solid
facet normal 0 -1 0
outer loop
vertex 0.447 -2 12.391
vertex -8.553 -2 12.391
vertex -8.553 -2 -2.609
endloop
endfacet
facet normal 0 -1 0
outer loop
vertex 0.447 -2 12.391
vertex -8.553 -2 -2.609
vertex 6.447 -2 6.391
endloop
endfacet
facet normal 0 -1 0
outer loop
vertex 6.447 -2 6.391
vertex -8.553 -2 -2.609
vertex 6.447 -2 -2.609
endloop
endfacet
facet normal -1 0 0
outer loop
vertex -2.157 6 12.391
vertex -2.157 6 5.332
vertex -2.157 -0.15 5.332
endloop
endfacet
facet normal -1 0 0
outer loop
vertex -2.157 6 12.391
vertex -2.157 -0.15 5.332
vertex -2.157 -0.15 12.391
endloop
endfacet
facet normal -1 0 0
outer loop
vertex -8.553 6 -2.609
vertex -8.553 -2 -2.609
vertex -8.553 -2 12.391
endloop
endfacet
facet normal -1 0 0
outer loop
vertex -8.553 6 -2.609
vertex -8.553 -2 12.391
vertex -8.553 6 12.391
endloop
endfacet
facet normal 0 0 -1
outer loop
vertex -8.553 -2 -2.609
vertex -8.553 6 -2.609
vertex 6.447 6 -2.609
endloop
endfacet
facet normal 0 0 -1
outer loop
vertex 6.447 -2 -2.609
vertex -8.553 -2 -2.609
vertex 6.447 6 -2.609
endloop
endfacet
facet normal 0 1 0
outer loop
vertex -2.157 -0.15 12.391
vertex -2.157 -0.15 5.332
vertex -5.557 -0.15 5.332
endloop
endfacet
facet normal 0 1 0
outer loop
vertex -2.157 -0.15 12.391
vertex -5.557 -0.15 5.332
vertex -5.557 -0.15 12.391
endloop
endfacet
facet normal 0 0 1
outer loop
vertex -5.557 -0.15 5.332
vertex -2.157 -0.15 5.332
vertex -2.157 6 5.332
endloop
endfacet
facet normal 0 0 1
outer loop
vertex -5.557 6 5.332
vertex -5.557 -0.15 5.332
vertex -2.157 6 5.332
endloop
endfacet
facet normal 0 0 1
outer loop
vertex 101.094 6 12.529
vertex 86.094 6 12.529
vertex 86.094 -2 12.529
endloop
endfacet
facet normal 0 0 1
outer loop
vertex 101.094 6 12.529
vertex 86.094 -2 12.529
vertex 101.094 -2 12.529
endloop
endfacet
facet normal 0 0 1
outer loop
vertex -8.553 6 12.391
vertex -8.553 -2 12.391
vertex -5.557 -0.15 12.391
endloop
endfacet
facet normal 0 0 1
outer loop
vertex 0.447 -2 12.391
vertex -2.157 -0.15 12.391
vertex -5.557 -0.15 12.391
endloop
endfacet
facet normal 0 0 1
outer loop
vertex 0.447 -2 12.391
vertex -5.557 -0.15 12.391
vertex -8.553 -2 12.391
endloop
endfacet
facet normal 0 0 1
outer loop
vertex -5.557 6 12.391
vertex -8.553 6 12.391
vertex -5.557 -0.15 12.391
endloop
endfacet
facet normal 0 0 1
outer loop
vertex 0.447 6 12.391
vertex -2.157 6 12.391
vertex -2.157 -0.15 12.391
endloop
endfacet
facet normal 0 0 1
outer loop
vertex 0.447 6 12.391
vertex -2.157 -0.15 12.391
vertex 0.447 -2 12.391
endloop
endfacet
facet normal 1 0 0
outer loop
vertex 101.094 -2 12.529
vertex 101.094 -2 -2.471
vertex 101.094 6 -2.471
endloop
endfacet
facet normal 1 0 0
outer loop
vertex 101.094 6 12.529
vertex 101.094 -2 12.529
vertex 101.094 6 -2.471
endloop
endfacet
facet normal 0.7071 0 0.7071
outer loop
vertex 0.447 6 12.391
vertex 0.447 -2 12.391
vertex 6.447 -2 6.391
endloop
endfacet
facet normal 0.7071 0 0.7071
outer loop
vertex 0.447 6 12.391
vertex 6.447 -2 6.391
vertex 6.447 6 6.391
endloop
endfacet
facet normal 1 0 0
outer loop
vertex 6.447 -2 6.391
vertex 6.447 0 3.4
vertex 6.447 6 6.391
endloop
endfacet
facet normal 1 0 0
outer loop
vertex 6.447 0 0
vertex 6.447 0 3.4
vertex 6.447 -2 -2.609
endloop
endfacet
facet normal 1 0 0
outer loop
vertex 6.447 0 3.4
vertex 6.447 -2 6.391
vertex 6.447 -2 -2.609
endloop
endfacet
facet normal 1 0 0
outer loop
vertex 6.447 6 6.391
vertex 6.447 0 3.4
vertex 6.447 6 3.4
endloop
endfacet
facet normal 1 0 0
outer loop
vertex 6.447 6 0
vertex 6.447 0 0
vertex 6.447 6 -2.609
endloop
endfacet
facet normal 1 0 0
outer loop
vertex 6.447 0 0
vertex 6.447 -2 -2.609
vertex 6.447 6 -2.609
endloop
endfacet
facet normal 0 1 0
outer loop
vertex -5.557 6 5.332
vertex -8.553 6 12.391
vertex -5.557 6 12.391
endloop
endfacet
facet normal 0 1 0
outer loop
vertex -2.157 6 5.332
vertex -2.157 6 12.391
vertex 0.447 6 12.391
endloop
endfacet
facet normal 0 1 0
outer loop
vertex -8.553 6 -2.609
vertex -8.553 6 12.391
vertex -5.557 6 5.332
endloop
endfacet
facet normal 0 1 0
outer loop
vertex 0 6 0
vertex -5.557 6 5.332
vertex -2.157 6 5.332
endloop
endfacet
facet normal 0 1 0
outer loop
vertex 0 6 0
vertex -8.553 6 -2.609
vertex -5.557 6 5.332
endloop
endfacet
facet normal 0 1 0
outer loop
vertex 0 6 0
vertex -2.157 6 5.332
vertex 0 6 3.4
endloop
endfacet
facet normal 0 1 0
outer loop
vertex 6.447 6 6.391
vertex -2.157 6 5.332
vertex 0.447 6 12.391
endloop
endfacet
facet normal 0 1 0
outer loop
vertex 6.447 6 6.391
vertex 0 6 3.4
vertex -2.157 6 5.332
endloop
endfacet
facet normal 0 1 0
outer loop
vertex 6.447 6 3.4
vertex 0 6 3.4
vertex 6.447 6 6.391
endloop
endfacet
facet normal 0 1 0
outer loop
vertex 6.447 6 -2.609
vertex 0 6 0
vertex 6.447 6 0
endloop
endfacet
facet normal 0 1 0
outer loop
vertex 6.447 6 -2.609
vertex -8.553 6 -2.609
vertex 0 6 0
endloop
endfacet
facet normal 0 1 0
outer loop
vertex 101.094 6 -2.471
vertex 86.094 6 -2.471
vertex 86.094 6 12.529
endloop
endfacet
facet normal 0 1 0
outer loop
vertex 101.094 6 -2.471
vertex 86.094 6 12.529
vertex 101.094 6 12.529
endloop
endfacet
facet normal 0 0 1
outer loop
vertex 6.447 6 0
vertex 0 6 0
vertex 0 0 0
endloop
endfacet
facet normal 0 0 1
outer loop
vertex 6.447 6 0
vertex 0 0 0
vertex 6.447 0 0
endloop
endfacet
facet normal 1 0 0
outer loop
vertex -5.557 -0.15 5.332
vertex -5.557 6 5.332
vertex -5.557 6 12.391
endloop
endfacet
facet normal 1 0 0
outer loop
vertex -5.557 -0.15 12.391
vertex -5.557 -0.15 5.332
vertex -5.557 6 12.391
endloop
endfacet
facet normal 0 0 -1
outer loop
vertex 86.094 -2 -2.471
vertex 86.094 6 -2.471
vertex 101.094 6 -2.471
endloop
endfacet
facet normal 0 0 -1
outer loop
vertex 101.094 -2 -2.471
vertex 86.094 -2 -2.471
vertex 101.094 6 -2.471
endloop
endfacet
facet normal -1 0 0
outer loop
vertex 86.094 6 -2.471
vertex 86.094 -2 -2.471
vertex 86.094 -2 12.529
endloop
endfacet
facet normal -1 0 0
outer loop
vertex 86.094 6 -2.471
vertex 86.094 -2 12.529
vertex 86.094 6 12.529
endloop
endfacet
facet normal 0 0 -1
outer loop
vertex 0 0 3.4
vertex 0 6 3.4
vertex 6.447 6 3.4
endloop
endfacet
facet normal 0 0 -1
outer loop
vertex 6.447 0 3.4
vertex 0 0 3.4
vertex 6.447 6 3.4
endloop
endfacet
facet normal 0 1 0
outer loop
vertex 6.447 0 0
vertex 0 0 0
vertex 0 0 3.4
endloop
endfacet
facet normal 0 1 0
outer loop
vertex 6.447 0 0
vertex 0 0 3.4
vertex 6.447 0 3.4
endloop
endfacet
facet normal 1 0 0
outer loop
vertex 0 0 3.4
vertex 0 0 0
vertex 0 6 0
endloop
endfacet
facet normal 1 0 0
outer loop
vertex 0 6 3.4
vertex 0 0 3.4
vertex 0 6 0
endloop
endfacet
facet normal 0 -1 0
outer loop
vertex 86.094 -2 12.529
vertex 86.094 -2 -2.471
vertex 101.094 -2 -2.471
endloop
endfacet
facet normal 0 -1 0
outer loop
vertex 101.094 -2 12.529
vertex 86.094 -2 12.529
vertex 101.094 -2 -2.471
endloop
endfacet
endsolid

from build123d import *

# Parameters (mm, degrees)
BOX_W             = 90
BOX_H             = 93.7
BOX_DEPTH         = 3.4
CLONE_PITCH_ANGLE = -90
ARRAY001_X_COUNT  = 3
ARRAY001_X_PITCH  = 97.7
ARRAY001_Y_COUNT  = 2
ARRAY001_Y_PITCH  = 97.7
ARRAY001_Z_COUNT  = 2
ARRAY001_Z_PITCH  = 97.7
ARRAY_X_COUNT     = 2
ARRAY_X_PITCH     = 97.7
ARRAY_Z_COUNT     = 3
ARRAY_Z_PITCH     = 97.7
BOX001_W          = 15
BOX001_H          = 8
BOX001_DEPTH      = 15
CHAMFER_SIZE      = 6
BOX002_W          = 15
BOX002_H          = 8
BOX002_DEPTH      = 15


with BuildPart() as cubo:
    # Box → Box (new body)
    with BuildSketch(Plane.XY):
        with Locations((45, 46.85)):
            Rectangle(BOX_W, BOX_H)
    extrude(amount=BOX_DEPTH)


with BuildPart() as array001:
    # Clone base: copy of Cubo
    add(cubo.part)


with BuildPart() as array001_1:
    # Clone pitch: moved
    add(array001.part.rotate(Axis((0, 0, 0), (0, 1, 0)), CLONE_PITCH_ANGLE))


with BuildPart() as array001_2:
    # Clone placement: moved
    add(array001_1.part.moved(Location((-0.3, -0.15, 3.4))))

    # Array001 X: Array001 ×3


with BuildPart() as array001_3:
    add(array001_2.part)
    with Locations(*[(i * ARRAY001_X_PITCH, 0, 0) for i in range(1, ARRAY001_X_COUNT)]):
        add(array001_2.part)

    # Array001 Y: Array001 ×2


with BuildPart() as array001_4:
    add(array001_3.part)
    with Locations(*[(0, i * ARRAY001_Y_PITCH, 0) for i in range(1, ARRAY001_Y_COUNT)]):
        add(array001_3.part)

    # Array001 Z: Array001 ×2


with BuildPart() as array001_5:
    add(array001_4.part)
    with Locations(*[(0, 0, i * ARRAY001_Z_PITCH) for i in range(1, ARRAY001_Z_COUNT)]):
        add(array001_4.part)


with BuildPart() as array001_6:
    # Array001 placement: moved
    add(array001_5.part.moved(Location((-1.857019, 0, 1.932093))))


with BuildPart() as fusion:
    # Array base: copy of Cubo
    add(cubo.part)

    # Array X: Fusion ×2


with BuildPart() as fusion_1:
    add(fusion.part)
    with Locations(*[(i * ARRAY_X_PITCH, 0, 0) for i in range(1, ARRAY_X_COUNT)]):
        add(fusion.part)

    # Array Z: Fusion ×3


with BuildPart() as fusion_2:
    add(fusion_1.part)
    with Locations(*[(0, 0, i * ARRAY_Z_PITCH) for i in range(1, ARRAY_Z_COUNT)]):
        add(fusion_1.part)

    # Fusion: union Array001
    add(array001_6.part)


with BuildPart() as cut:
    # Box001 → Box001 (new body)
    with BuildSketch(Plane(origin=(-8.553426, -2, -2.60887), x_dir=(1, 0, 0), z_dir=(0, 0, 1))):
        with Locations((7.5, 4)):
            Rectangle(BOX001_W, BOX001_H)
    extrude(amount=BOX001_DEPTH)

    # Chamfer
    chamfer_edges = [cut.edges().sort_by_distance(p)[0] for p in [
        (6.446574, 2, 12.39113),
    ]]
    chamfer(chamfer_edges, length=CHAMFER_SIZE)

    # Cut: cut Fusion
    add(fusion_2.part, mode=Mode.SUBTRACT)


with BuildPart() as cubo002:
    # Box002 → Box002 (new body)
    with BuildSketch(Plane(origin=(86.093792, -2, -2.471374), x_dir=(1, 0, 0), z_dir=(0, 0, 1))):
        with Locations((7.5, 4)):
            Rectangle(BOX002_W, BOX002_H)
    extrude(amount=BOX002_DEPTH)


solid = Compound([cut.part, cubo002.part])
